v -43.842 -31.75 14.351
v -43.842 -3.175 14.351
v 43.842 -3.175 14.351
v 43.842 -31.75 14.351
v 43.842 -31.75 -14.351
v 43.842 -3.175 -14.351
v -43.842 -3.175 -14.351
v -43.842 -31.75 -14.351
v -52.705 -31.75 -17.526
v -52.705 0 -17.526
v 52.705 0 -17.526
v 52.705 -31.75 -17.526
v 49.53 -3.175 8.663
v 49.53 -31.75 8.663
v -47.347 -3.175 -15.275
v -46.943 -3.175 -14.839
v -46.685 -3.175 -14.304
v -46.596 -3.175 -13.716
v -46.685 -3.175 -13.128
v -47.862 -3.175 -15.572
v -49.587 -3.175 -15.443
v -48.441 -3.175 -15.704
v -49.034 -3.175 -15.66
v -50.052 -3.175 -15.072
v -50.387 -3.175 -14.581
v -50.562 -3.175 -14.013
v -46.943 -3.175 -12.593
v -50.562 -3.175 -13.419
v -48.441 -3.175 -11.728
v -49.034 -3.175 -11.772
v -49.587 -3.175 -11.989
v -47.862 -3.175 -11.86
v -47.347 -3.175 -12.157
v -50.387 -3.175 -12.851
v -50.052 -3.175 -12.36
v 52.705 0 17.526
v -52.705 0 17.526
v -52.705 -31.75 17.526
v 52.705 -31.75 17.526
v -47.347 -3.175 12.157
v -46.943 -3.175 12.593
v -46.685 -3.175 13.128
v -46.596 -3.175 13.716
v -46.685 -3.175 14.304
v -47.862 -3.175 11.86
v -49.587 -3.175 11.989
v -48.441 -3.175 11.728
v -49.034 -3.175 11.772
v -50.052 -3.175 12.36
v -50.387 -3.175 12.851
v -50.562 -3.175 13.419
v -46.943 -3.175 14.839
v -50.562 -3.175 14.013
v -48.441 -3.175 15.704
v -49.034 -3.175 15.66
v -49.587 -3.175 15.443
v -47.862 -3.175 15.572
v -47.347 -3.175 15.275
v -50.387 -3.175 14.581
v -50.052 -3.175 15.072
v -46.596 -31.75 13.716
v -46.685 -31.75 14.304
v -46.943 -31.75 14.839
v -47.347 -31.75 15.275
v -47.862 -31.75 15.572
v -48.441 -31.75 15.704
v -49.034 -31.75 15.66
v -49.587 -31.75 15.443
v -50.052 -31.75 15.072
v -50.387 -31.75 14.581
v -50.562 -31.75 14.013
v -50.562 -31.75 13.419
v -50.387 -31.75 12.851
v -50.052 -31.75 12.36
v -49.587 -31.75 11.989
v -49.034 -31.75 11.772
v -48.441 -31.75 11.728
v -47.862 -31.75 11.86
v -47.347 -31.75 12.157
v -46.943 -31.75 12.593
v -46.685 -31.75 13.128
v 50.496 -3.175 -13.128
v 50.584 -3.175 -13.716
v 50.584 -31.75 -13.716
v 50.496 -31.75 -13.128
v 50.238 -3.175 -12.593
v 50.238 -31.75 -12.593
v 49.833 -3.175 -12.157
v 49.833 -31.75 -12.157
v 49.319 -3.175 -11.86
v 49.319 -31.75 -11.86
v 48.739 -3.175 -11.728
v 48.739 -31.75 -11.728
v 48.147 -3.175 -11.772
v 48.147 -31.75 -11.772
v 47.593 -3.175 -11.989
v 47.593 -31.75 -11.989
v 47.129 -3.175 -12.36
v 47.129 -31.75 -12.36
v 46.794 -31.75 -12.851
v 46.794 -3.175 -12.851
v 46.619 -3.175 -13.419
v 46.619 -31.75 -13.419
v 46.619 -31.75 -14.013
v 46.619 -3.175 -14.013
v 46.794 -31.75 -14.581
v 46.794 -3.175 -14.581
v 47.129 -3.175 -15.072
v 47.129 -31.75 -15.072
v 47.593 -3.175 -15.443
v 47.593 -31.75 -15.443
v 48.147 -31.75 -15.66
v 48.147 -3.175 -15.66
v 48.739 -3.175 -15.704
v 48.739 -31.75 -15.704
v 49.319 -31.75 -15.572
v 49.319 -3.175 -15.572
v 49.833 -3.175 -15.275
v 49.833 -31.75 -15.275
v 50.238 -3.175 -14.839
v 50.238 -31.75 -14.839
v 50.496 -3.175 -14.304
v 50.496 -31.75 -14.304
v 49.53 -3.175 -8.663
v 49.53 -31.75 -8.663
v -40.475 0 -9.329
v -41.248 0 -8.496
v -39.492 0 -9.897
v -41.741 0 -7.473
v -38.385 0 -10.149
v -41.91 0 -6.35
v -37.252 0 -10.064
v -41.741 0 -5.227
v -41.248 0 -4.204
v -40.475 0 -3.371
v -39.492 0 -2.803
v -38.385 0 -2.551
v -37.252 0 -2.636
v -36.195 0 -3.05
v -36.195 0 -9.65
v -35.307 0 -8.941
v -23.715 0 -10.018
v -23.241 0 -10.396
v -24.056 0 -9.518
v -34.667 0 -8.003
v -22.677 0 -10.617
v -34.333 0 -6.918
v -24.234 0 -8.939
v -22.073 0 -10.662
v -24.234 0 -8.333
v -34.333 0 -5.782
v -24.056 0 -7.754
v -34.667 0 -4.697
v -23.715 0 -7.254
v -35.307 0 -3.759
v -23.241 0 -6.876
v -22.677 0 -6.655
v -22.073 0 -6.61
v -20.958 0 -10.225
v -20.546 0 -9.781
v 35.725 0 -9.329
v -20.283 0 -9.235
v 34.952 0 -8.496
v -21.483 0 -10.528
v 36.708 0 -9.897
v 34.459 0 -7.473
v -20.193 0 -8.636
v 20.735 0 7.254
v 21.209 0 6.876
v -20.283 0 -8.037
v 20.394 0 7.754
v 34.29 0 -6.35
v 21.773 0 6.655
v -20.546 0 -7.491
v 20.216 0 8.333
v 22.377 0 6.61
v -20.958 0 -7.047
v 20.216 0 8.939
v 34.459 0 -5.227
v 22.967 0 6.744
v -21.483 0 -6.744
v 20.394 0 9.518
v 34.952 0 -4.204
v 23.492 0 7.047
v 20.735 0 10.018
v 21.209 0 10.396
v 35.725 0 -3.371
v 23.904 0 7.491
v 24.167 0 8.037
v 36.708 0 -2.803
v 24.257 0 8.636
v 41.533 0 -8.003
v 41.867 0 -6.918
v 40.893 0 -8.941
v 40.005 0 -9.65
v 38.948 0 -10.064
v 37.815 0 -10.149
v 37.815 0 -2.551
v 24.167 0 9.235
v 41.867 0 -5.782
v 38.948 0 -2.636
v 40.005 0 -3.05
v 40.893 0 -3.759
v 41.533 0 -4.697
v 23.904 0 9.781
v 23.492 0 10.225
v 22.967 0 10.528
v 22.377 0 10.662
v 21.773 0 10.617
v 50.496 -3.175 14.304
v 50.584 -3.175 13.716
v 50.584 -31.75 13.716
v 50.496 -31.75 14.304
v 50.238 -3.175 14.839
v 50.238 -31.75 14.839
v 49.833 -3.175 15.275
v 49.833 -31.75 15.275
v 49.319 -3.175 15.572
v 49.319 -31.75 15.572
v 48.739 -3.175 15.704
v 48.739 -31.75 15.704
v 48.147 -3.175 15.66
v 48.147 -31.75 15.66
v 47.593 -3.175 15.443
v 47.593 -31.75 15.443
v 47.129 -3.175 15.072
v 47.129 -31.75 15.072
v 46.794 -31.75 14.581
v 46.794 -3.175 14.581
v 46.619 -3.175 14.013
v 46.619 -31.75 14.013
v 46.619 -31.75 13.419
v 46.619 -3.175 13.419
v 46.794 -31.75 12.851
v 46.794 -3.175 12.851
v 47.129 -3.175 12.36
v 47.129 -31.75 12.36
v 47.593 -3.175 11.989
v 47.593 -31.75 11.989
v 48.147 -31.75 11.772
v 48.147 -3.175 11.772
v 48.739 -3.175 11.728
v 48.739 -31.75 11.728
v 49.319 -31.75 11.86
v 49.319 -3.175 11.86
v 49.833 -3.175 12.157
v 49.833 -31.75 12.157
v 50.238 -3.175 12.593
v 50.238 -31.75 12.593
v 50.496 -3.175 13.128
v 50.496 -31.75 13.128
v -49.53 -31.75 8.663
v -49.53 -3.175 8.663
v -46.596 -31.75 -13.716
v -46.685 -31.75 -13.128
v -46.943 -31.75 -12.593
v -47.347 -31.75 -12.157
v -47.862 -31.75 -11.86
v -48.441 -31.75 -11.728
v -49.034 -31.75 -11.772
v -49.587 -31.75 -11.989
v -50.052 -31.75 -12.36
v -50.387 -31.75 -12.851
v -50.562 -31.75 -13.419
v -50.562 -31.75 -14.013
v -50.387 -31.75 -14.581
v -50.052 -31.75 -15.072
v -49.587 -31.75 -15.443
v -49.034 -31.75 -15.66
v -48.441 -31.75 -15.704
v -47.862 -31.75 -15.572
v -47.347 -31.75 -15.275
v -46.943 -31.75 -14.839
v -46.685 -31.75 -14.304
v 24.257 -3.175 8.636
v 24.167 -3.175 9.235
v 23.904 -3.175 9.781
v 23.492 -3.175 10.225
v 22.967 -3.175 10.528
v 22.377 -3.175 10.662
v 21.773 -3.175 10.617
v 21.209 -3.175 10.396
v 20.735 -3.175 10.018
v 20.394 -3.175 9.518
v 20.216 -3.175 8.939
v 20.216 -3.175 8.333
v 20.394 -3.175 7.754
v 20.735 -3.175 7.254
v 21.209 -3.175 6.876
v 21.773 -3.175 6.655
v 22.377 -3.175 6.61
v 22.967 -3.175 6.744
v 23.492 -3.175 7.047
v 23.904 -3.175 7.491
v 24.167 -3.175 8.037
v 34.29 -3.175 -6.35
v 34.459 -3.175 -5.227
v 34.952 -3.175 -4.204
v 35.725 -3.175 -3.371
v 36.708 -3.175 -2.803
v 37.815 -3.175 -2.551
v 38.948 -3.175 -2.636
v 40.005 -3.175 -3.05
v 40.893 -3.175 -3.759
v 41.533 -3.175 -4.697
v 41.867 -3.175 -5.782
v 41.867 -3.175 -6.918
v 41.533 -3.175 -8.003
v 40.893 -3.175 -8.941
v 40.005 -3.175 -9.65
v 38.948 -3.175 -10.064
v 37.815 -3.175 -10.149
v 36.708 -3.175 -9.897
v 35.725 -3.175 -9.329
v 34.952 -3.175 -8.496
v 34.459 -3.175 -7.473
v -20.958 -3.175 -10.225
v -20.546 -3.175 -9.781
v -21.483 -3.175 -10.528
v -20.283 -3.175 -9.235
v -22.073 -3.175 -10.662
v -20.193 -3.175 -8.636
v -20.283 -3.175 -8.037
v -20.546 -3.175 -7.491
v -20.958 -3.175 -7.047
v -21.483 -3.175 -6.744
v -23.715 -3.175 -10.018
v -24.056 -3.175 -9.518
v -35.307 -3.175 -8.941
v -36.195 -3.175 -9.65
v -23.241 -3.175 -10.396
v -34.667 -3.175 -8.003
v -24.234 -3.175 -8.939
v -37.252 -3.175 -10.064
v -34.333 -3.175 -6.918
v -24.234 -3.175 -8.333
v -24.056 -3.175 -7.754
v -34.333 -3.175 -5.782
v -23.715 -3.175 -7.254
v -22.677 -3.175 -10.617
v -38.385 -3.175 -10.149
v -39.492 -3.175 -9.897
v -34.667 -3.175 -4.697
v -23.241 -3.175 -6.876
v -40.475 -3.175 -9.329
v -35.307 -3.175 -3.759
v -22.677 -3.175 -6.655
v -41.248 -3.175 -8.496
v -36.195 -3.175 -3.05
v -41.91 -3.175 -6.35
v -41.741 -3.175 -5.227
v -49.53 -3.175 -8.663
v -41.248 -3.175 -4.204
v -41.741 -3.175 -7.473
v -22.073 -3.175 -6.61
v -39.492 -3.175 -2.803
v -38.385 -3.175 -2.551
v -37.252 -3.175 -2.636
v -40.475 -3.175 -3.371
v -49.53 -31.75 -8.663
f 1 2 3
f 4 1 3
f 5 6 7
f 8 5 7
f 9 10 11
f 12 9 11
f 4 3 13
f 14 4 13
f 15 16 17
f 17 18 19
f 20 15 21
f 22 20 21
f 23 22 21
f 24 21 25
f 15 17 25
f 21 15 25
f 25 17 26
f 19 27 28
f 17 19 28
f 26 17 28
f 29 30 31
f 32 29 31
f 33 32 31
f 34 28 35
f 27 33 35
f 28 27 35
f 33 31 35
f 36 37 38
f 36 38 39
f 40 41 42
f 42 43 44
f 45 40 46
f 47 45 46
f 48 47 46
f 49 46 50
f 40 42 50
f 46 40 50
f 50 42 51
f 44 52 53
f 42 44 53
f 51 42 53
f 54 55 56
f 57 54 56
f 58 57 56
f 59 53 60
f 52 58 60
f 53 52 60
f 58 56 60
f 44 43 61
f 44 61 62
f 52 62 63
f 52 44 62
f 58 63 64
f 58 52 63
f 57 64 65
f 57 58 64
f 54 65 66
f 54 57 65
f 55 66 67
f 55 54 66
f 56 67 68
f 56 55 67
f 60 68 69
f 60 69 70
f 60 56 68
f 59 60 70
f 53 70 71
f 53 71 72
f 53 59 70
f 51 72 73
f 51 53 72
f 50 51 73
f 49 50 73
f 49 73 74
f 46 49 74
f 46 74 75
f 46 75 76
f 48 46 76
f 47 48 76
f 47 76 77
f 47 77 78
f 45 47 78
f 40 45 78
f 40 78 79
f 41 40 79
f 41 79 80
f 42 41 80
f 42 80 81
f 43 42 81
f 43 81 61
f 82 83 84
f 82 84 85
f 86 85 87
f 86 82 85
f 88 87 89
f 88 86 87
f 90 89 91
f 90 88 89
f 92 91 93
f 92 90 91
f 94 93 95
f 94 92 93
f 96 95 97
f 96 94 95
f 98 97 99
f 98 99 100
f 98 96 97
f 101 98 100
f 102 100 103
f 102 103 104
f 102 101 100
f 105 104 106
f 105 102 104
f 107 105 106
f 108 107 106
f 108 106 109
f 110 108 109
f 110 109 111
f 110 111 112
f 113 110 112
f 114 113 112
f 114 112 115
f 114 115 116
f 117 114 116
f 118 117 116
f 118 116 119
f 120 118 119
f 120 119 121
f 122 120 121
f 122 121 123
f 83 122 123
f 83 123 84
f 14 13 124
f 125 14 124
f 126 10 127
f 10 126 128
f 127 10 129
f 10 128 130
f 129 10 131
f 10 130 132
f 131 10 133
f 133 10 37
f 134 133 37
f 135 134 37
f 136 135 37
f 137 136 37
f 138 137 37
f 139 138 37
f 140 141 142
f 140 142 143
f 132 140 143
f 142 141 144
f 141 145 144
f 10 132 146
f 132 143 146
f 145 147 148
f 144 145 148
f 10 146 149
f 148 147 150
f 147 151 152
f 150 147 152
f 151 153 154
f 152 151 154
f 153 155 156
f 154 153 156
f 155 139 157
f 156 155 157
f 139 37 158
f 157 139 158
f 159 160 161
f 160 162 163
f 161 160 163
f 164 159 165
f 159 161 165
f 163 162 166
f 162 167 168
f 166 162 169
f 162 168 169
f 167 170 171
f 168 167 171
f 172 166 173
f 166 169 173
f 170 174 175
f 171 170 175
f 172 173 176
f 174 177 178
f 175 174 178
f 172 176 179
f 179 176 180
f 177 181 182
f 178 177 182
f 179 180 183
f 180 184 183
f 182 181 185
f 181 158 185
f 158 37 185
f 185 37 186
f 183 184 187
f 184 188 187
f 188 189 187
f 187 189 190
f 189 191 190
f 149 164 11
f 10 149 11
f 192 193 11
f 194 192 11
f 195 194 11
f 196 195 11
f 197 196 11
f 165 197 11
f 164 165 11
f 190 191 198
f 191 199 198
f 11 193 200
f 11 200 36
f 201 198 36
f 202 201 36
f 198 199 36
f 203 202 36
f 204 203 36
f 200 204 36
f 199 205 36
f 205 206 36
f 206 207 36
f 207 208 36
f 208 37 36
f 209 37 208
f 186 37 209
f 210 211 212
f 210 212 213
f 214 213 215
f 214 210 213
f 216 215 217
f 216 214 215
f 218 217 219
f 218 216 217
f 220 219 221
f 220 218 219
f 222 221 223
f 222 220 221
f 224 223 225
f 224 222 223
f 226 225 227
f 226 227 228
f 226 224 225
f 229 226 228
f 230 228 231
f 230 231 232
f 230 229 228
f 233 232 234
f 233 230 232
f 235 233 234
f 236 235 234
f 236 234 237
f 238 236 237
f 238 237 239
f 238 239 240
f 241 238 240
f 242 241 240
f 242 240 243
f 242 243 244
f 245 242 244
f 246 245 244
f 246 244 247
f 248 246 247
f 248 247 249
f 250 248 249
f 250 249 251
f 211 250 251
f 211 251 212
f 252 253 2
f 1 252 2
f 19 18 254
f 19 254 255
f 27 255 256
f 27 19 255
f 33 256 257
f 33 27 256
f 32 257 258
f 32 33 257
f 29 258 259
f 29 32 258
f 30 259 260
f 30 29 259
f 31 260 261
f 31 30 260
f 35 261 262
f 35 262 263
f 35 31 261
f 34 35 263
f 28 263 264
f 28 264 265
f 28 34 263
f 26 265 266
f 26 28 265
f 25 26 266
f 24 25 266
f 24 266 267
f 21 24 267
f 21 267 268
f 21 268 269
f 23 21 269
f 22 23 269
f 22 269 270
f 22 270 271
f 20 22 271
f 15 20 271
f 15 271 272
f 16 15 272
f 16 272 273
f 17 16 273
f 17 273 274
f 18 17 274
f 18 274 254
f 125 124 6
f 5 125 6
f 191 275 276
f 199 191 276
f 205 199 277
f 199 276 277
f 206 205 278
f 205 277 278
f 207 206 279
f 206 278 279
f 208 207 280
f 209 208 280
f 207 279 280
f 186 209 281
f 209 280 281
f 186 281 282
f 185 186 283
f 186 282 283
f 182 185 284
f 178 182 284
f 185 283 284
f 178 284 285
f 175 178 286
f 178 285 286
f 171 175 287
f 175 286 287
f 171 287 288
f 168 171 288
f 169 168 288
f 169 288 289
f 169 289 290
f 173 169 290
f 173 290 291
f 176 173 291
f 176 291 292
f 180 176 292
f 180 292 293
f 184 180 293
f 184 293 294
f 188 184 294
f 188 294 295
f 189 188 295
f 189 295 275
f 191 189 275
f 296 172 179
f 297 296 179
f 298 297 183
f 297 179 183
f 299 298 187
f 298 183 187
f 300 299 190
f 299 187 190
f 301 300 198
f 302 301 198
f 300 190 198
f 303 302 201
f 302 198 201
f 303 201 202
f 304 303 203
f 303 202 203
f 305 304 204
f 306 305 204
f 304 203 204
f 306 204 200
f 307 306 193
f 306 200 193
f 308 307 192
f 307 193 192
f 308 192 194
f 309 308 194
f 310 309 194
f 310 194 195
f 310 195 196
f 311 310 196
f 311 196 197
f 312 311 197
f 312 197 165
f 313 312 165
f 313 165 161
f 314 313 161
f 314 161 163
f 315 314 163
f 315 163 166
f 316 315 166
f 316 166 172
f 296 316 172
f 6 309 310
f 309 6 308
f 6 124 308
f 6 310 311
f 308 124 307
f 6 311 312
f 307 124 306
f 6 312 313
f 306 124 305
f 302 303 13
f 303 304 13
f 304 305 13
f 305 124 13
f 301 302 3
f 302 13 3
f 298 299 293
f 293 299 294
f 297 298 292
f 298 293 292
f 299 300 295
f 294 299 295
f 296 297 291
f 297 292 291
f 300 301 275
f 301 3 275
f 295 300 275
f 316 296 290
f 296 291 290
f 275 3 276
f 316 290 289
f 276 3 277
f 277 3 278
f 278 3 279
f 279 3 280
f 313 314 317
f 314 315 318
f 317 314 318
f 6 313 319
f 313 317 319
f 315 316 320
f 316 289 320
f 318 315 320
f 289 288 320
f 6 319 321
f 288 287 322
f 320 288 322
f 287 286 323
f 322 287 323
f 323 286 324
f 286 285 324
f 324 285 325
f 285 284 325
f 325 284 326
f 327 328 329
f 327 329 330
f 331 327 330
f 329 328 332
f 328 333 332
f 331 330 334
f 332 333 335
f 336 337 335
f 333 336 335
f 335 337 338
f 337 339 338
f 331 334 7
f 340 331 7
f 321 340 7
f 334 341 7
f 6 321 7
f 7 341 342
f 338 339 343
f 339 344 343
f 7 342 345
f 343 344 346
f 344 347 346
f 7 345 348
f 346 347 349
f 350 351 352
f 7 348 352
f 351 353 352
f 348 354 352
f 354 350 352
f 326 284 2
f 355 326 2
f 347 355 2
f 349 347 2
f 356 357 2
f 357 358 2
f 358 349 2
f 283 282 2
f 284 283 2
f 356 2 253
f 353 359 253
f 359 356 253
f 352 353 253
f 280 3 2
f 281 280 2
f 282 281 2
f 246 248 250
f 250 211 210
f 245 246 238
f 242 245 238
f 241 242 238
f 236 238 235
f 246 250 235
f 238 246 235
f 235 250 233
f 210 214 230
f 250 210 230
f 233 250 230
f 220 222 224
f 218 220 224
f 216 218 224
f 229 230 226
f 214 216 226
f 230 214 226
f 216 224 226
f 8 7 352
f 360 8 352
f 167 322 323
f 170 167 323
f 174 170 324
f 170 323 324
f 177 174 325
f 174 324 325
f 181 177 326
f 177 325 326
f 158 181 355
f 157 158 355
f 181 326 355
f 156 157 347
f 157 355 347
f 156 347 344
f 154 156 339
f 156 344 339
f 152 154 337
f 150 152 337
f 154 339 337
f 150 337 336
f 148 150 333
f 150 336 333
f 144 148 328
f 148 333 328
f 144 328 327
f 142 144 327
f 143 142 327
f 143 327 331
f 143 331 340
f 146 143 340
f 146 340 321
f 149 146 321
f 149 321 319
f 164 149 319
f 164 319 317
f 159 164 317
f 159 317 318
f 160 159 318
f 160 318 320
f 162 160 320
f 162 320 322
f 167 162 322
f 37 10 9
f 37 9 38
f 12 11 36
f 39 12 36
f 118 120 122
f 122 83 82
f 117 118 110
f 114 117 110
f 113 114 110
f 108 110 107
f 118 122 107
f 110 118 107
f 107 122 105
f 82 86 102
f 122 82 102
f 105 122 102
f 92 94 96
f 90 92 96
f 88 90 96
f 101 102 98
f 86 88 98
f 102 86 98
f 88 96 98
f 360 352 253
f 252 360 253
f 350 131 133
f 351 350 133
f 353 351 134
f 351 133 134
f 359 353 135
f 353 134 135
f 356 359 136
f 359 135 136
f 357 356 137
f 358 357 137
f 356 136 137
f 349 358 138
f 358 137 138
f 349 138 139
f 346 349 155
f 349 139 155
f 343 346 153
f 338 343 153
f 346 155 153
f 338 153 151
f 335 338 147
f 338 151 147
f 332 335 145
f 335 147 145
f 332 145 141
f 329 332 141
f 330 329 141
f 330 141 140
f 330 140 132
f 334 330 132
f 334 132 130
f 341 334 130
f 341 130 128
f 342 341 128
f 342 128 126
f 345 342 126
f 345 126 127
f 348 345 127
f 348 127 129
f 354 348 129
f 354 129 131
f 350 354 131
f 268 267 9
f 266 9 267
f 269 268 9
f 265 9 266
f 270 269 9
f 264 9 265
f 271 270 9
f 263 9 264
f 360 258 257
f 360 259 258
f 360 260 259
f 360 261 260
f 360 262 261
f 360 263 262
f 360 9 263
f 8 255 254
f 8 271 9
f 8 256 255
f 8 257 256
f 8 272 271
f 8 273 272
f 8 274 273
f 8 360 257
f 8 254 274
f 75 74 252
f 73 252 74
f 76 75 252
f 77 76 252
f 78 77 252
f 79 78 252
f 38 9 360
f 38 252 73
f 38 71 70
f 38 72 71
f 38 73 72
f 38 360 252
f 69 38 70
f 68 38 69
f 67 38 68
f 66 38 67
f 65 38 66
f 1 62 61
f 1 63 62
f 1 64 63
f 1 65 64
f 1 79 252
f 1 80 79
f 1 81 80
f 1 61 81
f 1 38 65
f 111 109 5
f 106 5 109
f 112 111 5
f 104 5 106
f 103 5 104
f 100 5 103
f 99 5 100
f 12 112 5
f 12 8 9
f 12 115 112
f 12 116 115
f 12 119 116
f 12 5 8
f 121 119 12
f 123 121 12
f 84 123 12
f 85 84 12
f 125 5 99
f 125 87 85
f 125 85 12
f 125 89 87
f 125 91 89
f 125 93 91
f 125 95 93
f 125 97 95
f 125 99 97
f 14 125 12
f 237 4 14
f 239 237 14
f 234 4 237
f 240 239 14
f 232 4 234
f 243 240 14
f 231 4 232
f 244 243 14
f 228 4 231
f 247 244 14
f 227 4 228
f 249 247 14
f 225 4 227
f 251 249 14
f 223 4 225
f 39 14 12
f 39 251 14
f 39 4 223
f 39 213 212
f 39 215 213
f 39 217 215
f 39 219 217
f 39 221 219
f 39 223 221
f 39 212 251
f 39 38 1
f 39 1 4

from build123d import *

# Parameters (mm, degrees)
F0_W     = 105.41
F0_H     = 35.052
F0_R     = 1.9939
F1_DEPTH = 31.75
F2_W     = 105.41
F2_H     = 35.052
F3_DEPTH = 3.175
F4_R     = 3.81
F5_DEPTH = 25.4
F6_R     = 2.032
F7_DEPTH = 25.4


with BuildPart() as f1:
    # F0 (on Front) → F1 (new body)
    with BuildSketch(Plane.XZ):
        Rectangle(F0_W, F0_H)
        with Locations((-48.5902, -13.716)):
            Circle(F0_R, mode=Mode.SUBTRACT)
        with Locations((48.5902, -13.716)):
            Circle(F0_R, mode=Mode.SUBTRACT)
        with Locations((-48.5902, 13.716)):
            Circle(F0_R, mode=Mode.SUBTRACT)
        Polygon((-49.53, -8.662538), (-49.53, 8.662538), (-43.841538, 14.351), (43.841538, 14.351), (49.53, 8.662538), (49.53, -8.662538), (43.841538, -14.351), (-43.841538, -14.351), align=None, mode=Mode.SUBTRACT)
        with Locations((48.5902, 13.716)):
            Circle(F0_R, mode=Mode.SUBTRACT)
    extrude(amount=F1_DEPTH)

    # F2 (on face) → F3 (join)
    with BuildSketch(Plane(origin=(0, 0, 0), x_dir=(-1, 0, 0), z_dir=(0, 1, 0))):
        Rectangle(F2_W, F2_H)
    extrude(amount=-F3_DEPTH)

    # F4 (on face) → F5 (cut)
    with BuildSketch(Plane(origin=(0, 0, 0), x_dir=(-1, 0, 0), z_dir=(0, 1, 0))):
        with Locations((-38.1, -6.35)):
            Circle(F4_R)
        with Locations((38.1, -6.35)):
            Circle(F4_R)
    extrude(amount=-F5_DEPTH, mode=Mode.SUBTRACT)

    # F6 (on face) → F7 (cut)
    with BuildSketch(Plane.XZ.offset(3.175)):
        with Locations((22.225, 8.636)):
            Circle(F6_R)
        with Locations((-22.225, -8.636)):
            Circle(F6_R)
    extrude(amount=-F7_DEPTH, mode=Mode.SUBTRACT)


solid = f1.part
